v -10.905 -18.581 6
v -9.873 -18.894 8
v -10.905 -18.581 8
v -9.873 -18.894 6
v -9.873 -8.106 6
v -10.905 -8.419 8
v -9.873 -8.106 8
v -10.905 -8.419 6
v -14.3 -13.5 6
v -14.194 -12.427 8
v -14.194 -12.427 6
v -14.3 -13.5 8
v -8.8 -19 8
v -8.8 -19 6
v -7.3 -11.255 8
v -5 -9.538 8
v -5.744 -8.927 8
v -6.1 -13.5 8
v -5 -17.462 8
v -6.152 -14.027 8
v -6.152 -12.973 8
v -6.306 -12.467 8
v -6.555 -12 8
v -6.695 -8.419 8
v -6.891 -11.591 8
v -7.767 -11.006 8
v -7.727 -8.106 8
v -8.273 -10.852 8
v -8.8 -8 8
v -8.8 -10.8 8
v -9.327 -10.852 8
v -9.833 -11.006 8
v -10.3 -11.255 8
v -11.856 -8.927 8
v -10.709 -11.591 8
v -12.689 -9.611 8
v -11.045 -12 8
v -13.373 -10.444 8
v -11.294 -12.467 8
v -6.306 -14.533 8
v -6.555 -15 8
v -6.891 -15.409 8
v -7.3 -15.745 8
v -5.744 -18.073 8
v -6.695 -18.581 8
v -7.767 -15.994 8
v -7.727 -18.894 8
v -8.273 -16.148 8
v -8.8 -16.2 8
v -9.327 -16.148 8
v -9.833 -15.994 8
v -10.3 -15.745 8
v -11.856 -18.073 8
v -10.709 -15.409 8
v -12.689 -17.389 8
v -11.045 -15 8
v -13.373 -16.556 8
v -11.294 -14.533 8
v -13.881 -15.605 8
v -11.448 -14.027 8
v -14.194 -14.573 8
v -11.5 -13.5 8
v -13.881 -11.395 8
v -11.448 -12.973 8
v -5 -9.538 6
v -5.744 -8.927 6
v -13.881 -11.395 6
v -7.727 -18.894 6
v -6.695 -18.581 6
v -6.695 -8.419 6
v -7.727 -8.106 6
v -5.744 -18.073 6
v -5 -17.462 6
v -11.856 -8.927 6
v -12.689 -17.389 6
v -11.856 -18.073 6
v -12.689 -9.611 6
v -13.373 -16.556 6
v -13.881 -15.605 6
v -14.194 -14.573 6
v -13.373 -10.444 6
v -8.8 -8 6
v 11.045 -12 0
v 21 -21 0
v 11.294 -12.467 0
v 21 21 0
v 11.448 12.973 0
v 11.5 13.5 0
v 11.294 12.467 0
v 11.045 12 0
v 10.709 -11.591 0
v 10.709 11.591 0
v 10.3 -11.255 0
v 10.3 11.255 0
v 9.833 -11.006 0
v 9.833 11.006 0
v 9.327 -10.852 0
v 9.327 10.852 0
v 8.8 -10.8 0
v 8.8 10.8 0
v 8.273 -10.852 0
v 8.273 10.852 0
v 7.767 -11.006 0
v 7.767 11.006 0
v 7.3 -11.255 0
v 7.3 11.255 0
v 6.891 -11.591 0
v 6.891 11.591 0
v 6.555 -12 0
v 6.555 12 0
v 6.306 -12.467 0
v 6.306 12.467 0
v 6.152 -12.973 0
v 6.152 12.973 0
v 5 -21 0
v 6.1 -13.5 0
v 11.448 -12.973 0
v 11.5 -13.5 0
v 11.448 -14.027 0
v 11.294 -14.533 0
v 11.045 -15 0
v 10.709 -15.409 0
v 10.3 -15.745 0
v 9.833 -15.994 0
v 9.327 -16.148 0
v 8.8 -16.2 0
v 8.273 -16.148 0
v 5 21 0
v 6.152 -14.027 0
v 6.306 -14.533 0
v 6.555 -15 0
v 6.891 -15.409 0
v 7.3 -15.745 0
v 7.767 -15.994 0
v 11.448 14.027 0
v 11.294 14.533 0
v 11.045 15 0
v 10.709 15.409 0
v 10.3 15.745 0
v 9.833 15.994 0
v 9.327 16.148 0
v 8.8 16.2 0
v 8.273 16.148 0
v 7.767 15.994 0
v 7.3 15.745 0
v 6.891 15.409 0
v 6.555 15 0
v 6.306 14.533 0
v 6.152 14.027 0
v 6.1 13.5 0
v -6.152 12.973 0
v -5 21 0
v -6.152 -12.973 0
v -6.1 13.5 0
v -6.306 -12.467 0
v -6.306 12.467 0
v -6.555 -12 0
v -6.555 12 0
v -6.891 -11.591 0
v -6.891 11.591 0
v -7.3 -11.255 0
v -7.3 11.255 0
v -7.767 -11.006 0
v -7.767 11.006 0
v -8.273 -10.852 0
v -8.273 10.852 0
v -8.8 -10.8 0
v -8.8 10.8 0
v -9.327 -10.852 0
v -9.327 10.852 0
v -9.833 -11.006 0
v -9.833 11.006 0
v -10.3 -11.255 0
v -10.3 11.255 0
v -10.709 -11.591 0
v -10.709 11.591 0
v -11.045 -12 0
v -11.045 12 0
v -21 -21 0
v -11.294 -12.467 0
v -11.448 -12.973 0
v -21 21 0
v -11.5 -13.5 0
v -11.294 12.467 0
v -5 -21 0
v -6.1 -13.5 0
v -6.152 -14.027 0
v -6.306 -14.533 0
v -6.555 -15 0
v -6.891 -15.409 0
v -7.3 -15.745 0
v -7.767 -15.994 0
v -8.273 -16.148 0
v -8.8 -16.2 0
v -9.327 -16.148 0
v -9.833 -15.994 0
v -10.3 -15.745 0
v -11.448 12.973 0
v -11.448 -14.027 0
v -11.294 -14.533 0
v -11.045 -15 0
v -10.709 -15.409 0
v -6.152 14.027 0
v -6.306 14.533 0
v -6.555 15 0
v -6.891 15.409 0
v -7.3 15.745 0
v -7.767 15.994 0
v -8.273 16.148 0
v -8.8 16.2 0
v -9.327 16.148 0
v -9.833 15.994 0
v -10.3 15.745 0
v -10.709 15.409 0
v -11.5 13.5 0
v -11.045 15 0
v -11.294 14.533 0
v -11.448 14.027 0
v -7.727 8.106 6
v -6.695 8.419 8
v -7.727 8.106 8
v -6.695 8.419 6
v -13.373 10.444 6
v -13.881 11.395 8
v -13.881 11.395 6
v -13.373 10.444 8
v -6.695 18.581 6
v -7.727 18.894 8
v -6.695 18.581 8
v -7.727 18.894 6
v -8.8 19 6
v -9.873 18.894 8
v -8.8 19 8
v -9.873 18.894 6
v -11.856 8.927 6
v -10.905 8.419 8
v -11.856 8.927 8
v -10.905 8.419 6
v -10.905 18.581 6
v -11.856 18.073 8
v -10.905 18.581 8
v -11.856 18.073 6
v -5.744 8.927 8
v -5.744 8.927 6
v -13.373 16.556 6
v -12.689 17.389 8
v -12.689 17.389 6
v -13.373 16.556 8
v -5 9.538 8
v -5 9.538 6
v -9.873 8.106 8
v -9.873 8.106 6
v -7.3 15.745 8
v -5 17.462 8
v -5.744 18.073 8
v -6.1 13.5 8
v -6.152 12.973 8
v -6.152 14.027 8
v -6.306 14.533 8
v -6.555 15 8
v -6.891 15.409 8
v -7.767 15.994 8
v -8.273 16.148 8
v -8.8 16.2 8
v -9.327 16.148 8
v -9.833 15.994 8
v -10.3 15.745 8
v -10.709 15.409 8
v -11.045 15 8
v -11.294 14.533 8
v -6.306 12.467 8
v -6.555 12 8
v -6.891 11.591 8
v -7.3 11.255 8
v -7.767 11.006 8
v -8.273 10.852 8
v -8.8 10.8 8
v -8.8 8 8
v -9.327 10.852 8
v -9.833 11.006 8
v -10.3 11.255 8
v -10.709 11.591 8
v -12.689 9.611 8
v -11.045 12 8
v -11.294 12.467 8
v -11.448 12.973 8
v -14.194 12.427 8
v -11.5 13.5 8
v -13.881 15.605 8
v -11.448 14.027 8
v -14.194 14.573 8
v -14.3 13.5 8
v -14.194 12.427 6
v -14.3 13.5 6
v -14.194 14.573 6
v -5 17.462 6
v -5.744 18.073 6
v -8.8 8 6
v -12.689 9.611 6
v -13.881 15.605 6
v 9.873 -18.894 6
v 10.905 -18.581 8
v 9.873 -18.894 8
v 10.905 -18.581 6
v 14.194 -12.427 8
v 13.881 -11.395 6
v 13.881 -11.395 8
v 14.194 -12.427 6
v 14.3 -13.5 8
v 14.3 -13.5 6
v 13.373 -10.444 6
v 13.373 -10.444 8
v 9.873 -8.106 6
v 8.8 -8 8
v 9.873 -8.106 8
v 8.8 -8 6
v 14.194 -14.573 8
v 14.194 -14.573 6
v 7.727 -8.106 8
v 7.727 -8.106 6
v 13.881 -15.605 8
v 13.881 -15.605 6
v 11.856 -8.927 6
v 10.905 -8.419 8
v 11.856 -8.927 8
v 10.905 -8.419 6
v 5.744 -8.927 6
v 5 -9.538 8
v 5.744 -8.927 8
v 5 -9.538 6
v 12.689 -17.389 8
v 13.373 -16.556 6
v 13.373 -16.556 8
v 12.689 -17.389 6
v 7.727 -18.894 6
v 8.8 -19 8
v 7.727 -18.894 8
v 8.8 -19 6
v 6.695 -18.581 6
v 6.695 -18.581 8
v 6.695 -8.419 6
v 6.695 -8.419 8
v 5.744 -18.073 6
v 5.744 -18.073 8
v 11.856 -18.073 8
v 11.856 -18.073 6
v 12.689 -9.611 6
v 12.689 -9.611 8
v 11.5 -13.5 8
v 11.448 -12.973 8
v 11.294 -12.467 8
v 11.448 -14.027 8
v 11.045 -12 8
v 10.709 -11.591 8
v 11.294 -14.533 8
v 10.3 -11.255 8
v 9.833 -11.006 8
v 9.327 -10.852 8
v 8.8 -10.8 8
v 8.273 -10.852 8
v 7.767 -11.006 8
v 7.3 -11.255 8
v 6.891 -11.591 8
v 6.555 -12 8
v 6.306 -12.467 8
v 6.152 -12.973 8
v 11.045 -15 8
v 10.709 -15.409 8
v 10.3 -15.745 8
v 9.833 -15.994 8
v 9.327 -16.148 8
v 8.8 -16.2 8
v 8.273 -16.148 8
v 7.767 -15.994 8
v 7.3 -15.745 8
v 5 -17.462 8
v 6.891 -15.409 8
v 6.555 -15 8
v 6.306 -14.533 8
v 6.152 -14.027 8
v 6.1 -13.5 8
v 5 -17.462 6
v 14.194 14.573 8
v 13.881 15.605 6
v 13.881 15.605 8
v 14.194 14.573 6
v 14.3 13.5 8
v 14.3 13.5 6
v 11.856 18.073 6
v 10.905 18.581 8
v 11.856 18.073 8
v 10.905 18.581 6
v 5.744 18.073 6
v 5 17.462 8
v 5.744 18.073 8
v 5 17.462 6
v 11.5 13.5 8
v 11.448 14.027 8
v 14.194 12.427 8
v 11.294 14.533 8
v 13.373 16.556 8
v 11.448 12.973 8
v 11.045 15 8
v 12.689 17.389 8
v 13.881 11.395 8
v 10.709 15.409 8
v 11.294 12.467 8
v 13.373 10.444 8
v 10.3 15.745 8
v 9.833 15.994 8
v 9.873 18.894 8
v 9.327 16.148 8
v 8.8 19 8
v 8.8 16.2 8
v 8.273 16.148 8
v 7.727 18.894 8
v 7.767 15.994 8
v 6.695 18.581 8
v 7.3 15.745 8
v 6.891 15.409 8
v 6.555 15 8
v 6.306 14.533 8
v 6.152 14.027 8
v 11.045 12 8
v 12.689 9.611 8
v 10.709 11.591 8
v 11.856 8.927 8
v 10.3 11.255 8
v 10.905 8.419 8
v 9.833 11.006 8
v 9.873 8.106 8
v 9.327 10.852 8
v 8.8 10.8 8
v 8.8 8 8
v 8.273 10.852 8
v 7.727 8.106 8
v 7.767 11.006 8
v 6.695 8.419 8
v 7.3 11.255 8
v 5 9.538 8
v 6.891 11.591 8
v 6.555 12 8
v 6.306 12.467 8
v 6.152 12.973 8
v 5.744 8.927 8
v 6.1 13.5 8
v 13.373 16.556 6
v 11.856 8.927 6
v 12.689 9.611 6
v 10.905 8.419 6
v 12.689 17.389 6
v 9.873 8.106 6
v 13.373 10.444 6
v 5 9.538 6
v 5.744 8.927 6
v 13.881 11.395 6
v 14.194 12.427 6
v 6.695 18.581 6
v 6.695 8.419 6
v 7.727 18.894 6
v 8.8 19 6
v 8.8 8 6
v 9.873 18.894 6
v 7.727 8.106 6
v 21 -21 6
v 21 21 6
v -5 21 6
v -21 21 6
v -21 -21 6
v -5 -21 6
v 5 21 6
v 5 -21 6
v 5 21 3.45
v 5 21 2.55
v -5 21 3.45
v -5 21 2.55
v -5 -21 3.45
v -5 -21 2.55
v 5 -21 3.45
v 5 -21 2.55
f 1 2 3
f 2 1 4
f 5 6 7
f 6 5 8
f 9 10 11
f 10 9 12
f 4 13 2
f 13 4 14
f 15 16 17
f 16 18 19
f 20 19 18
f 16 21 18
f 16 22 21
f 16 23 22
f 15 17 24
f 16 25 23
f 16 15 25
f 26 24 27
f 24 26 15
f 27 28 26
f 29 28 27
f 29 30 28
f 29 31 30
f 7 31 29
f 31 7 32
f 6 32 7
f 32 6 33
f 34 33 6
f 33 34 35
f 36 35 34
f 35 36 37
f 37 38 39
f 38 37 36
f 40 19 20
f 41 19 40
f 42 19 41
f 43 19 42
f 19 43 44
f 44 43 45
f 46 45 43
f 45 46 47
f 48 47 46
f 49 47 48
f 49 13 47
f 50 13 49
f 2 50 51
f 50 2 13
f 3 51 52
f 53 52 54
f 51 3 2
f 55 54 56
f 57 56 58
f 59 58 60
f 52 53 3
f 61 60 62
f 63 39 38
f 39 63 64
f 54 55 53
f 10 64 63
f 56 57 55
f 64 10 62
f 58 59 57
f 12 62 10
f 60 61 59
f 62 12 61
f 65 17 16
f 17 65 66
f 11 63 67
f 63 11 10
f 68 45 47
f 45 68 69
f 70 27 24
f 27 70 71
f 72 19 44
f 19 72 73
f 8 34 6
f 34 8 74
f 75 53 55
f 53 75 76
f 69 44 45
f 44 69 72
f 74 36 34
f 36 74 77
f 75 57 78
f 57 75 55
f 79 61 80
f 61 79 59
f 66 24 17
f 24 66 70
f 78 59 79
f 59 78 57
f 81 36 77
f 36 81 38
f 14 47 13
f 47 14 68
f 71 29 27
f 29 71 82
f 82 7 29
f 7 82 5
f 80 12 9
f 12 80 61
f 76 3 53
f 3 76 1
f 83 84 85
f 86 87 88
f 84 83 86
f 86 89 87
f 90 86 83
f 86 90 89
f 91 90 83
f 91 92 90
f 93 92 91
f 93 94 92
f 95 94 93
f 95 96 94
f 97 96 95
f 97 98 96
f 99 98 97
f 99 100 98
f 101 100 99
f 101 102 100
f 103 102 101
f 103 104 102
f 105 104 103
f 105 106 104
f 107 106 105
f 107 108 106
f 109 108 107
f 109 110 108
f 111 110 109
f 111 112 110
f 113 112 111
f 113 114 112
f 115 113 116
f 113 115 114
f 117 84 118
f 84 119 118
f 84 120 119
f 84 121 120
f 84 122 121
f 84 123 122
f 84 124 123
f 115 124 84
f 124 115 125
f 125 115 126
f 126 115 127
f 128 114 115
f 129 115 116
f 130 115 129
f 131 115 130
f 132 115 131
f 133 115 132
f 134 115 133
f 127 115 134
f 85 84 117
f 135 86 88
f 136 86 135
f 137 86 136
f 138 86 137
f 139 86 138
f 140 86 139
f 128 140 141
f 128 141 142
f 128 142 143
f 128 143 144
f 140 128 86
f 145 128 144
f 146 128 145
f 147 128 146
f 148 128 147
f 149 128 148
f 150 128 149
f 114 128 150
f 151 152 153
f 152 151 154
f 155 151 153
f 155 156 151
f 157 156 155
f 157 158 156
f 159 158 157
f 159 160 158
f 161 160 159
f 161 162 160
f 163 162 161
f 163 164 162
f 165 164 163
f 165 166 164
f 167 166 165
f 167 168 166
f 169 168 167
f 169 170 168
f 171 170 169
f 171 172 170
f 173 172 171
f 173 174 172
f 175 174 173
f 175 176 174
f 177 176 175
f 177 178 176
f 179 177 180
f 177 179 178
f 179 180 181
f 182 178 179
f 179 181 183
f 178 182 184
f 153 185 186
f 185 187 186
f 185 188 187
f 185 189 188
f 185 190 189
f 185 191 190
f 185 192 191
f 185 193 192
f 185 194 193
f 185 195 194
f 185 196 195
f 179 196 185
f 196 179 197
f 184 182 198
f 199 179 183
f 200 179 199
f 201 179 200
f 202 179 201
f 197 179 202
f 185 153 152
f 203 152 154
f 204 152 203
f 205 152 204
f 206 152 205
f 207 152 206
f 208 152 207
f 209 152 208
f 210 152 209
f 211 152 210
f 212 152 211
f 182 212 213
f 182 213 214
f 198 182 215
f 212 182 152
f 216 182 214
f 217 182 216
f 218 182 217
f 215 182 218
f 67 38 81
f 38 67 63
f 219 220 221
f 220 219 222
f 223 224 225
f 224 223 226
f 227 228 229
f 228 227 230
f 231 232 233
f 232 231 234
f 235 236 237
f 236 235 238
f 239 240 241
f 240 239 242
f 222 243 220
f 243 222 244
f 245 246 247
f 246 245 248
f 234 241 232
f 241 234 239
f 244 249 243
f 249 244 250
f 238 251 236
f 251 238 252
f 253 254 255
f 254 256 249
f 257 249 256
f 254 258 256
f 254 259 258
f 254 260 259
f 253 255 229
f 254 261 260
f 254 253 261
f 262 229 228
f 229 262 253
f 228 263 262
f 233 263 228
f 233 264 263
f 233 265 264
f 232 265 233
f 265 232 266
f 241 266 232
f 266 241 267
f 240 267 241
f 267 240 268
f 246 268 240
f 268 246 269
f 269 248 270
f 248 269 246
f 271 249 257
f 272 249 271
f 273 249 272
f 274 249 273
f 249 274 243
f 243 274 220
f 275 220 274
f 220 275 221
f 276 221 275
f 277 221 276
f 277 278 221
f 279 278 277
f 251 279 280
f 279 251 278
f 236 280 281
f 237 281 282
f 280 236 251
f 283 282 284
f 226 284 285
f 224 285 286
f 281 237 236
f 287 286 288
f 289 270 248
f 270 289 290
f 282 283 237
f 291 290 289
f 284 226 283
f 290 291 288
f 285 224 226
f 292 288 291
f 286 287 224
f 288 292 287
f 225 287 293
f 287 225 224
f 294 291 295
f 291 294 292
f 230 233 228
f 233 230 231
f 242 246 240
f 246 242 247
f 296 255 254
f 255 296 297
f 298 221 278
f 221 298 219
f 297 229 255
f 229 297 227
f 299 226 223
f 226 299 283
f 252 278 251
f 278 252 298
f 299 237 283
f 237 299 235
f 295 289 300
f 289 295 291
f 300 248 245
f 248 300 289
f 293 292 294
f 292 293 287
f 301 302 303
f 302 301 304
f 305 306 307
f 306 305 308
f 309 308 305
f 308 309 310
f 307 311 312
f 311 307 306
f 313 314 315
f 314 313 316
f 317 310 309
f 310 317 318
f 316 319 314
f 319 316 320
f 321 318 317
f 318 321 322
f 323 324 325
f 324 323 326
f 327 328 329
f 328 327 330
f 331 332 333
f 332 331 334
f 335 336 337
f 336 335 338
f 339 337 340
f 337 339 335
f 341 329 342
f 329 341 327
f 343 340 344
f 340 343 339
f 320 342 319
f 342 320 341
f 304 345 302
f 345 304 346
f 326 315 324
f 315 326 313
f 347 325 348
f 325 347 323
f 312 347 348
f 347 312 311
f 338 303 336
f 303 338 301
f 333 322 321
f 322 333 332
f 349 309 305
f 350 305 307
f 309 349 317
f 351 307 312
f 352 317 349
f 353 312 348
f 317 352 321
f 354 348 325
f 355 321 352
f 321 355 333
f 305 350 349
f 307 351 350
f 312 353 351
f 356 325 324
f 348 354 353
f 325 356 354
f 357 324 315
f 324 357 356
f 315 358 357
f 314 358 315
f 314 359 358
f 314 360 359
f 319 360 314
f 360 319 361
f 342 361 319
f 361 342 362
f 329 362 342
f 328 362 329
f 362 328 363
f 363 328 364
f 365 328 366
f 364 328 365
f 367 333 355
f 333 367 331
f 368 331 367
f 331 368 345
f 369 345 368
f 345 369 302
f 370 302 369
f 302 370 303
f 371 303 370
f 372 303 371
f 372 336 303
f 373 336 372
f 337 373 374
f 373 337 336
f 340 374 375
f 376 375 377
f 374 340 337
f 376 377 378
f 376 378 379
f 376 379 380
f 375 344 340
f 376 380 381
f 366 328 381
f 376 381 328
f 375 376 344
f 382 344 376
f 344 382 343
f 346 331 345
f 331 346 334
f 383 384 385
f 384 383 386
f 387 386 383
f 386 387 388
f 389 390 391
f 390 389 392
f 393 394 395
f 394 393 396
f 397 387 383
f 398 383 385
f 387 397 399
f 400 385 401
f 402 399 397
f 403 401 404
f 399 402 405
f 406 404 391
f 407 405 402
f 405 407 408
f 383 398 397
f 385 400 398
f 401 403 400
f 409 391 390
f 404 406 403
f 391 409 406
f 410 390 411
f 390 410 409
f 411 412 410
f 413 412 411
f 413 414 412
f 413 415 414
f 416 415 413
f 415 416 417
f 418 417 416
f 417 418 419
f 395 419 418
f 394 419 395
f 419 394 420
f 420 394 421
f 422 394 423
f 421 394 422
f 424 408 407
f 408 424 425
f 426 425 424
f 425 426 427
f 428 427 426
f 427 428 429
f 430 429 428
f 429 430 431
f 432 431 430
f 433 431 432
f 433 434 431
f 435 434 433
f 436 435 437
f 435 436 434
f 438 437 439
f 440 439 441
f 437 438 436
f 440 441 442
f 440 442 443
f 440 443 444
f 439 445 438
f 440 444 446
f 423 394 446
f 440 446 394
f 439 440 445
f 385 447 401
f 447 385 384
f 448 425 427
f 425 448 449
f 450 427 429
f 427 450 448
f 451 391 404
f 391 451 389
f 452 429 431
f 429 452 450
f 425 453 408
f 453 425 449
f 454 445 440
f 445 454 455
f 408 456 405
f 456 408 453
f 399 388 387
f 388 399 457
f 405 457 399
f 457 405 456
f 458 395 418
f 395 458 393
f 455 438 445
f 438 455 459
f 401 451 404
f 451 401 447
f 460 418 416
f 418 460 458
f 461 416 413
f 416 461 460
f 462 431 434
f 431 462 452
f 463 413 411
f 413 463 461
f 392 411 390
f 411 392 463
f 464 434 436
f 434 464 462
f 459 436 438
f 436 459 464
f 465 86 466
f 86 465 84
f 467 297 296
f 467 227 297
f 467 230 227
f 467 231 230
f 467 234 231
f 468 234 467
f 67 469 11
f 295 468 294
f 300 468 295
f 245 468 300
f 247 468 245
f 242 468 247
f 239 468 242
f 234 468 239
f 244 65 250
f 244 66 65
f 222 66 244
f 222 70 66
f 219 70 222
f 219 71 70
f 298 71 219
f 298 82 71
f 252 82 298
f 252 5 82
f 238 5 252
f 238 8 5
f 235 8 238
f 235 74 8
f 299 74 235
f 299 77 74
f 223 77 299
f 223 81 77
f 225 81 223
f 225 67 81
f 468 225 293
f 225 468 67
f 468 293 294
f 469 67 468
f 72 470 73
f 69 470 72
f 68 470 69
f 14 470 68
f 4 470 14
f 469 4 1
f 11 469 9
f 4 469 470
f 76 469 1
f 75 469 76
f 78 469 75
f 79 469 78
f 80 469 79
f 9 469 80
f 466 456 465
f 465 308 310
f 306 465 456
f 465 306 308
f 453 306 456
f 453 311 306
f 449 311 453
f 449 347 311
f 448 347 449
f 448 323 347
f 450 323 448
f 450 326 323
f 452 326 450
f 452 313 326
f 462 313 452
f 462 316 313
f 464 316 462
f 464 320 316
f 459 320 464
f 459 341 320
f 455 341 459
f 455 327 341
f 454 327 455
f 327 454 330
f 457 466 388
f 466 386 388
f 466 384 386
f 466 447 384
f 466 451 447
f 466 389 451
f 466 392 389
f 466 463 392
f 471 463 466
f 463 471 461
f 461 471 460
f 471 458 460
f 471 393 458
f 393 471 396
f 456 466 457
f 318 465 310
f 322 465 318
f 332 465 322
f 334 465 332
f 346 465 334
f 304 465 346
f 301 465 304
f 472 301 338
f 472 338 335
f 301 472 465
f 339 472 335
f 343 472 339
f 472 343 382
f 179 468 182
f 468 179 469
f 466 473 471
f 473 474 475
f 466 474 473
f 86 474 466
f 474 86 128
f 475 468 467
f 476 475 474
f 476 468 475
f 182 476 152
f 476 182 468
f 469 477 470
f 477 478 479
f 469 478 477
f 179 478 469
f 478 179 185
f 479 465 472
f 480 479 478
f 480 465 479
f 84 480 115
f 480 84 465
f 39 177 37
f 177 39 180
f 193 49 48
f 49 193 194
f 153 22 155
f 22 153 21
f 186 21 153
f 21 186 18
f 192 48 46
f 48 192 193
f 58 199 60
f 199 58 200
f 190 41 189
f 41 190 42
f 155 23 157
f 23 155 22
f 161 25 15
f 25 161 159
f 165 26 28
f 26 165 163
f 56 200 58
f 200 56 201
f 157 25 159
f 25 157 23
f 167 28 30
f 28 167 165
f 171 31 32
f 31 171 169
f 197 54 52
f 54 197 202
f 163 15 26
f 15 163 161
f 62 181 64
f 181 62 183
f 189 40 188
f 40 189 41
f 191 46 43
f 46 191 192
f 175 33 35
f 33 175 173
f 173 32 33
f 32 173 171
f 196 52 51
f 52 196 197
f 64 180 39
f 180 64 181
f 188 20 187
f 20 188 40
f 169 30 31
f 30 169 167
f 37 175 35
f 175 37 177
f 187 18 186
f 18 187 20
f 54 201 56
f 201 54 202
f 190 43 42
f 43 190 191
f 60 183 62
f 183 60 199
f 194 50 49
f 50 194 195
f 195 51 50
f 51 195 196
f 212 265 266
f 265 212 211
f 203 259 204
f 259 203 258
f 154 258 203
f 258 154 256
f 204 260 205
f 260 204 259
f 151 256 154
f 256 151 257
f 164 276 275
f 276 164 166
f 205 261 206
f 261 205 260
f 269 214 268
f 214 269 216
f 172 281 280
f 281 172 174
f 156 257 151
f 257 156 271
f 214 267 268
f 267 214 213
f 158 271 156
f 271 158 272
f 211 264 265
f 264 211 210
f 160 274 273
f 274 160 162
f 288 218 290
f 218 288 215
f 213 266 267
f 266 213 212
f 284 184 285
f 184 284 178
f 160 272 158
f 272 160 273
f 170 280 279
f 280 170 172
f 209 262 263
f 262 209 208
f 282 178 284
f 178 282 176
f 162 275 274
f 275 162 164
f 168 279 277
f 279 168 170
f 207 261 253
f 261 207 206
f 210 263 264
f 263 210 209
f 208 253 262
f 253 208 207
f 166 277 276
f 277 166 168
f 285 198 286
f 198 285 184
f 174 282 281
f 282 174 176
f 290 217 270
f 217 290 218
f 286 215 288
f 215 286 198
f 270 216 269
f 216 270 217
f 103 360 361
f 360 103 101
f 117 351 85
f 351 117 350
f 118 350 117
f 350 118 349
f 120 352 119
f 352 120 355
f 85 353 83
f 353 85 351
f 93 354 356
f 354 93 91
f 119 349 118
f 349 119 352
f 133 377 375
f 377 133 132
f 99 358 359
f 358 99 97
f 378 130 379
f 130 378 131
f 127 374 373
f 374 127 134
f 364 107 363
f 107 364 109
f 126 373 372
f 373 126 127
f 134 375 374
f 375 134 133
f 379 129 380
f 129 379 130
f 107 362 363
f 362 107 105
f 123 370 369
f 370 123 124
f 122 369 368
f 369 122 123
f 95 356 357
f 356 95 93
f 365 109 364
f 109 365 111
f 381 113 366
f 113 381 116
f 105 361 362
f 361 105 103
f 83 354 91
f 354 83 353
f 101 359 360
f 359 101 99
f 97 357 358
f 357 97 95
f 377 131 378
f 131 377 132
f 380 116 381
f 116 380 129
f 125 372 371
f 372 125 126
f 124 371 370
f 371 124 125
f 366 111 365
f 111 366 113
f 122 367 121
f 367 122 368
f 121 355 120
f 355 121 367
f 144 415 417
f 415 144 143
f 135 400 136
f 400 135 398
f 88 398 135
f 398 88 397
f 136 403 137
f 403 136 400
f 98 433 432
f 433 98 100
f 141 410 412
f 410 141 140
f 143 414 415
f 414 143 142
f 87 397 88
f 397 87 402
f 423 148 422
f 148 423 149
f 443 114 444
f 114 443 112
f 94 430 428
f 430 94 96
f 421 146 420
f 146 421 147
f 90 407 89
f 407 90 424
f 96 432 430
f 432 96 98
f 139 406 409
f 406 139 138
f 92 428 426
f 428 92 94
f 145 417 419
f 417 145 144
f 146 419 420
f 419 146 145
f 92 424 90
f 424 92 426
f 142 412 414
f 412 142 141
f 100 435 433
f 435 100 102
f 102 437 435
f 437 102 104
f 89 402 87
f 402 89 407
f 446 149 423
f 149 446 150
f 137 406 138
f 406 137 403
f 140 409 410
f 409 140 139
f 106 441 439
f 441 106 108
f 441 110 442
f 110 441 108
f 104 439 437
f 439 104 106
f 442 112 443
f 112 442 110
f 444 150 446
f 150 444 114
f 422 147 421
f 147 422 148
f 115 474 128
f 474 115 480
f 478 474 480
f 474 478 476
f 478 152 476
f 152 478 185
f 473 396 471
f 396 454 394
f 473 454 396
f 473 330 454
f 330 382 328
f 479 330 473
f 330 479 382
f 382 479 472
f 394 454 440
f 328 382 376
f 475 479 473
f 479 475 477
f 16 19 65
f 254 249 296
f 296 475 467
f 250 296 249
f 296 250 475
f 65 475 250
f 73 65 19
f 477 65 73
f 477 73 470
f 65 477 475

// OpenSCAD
$fn = 32;

// ----------------------------------------------------------------------
// Living hinge: 42 x 42 mm plates, 0.9 mm flexible web
// ----------------------------------------------------------------------

// --- parameters (mm) ---
plate_len = 16;           // plate length outside the web
plate_w = 42;             // plate width
thick = 6;                // plate thickness
web_half = 5;             // half width of the flex band
web_t = 0.9;              // flexible web thickness
web_z = 2.55;             // web position inside the thickness
boss_d = 11;              // screw boss diameter
boss_h = 8;               // screw boss height
boss_x = 8.8;             // screw boss distance from the web
screw_d = 5.4;            // screw hole

difference() {
  union() {
    /* one flat strip, later thinned at the middle */
    translate([-21, -21, 0]) cube([42, 42, 6]);
    /* screw bosses, sunk 0.5 mm into the plates */
    for (sx = [-8.8, 8.8]) {
      for (sy = [-13.5, 13.5]) {
        translate([sx, sy, 0]) cylinder(h = boss_h, d = boss_d);
      }
    }
  }
  /* channel from below: leaves the web on top of it */
  translate([-5, -23.5, -2.5]) cube([10, 47, 5.05]);
  /* channel from above: thins the web down to web_t */
  translate([-5, -23.5, 3.45]) cube([10, 47, 5.05]);
  /* screw holes through the bosses */
  for (sx = [-8.8, 8.8]) {
    for (sy = [-13.5, 13.5]) {
      translate([sx, sy, -2.5]) cylinder(h = boss_h + 5, d = screw_d);
    }
  }
}
